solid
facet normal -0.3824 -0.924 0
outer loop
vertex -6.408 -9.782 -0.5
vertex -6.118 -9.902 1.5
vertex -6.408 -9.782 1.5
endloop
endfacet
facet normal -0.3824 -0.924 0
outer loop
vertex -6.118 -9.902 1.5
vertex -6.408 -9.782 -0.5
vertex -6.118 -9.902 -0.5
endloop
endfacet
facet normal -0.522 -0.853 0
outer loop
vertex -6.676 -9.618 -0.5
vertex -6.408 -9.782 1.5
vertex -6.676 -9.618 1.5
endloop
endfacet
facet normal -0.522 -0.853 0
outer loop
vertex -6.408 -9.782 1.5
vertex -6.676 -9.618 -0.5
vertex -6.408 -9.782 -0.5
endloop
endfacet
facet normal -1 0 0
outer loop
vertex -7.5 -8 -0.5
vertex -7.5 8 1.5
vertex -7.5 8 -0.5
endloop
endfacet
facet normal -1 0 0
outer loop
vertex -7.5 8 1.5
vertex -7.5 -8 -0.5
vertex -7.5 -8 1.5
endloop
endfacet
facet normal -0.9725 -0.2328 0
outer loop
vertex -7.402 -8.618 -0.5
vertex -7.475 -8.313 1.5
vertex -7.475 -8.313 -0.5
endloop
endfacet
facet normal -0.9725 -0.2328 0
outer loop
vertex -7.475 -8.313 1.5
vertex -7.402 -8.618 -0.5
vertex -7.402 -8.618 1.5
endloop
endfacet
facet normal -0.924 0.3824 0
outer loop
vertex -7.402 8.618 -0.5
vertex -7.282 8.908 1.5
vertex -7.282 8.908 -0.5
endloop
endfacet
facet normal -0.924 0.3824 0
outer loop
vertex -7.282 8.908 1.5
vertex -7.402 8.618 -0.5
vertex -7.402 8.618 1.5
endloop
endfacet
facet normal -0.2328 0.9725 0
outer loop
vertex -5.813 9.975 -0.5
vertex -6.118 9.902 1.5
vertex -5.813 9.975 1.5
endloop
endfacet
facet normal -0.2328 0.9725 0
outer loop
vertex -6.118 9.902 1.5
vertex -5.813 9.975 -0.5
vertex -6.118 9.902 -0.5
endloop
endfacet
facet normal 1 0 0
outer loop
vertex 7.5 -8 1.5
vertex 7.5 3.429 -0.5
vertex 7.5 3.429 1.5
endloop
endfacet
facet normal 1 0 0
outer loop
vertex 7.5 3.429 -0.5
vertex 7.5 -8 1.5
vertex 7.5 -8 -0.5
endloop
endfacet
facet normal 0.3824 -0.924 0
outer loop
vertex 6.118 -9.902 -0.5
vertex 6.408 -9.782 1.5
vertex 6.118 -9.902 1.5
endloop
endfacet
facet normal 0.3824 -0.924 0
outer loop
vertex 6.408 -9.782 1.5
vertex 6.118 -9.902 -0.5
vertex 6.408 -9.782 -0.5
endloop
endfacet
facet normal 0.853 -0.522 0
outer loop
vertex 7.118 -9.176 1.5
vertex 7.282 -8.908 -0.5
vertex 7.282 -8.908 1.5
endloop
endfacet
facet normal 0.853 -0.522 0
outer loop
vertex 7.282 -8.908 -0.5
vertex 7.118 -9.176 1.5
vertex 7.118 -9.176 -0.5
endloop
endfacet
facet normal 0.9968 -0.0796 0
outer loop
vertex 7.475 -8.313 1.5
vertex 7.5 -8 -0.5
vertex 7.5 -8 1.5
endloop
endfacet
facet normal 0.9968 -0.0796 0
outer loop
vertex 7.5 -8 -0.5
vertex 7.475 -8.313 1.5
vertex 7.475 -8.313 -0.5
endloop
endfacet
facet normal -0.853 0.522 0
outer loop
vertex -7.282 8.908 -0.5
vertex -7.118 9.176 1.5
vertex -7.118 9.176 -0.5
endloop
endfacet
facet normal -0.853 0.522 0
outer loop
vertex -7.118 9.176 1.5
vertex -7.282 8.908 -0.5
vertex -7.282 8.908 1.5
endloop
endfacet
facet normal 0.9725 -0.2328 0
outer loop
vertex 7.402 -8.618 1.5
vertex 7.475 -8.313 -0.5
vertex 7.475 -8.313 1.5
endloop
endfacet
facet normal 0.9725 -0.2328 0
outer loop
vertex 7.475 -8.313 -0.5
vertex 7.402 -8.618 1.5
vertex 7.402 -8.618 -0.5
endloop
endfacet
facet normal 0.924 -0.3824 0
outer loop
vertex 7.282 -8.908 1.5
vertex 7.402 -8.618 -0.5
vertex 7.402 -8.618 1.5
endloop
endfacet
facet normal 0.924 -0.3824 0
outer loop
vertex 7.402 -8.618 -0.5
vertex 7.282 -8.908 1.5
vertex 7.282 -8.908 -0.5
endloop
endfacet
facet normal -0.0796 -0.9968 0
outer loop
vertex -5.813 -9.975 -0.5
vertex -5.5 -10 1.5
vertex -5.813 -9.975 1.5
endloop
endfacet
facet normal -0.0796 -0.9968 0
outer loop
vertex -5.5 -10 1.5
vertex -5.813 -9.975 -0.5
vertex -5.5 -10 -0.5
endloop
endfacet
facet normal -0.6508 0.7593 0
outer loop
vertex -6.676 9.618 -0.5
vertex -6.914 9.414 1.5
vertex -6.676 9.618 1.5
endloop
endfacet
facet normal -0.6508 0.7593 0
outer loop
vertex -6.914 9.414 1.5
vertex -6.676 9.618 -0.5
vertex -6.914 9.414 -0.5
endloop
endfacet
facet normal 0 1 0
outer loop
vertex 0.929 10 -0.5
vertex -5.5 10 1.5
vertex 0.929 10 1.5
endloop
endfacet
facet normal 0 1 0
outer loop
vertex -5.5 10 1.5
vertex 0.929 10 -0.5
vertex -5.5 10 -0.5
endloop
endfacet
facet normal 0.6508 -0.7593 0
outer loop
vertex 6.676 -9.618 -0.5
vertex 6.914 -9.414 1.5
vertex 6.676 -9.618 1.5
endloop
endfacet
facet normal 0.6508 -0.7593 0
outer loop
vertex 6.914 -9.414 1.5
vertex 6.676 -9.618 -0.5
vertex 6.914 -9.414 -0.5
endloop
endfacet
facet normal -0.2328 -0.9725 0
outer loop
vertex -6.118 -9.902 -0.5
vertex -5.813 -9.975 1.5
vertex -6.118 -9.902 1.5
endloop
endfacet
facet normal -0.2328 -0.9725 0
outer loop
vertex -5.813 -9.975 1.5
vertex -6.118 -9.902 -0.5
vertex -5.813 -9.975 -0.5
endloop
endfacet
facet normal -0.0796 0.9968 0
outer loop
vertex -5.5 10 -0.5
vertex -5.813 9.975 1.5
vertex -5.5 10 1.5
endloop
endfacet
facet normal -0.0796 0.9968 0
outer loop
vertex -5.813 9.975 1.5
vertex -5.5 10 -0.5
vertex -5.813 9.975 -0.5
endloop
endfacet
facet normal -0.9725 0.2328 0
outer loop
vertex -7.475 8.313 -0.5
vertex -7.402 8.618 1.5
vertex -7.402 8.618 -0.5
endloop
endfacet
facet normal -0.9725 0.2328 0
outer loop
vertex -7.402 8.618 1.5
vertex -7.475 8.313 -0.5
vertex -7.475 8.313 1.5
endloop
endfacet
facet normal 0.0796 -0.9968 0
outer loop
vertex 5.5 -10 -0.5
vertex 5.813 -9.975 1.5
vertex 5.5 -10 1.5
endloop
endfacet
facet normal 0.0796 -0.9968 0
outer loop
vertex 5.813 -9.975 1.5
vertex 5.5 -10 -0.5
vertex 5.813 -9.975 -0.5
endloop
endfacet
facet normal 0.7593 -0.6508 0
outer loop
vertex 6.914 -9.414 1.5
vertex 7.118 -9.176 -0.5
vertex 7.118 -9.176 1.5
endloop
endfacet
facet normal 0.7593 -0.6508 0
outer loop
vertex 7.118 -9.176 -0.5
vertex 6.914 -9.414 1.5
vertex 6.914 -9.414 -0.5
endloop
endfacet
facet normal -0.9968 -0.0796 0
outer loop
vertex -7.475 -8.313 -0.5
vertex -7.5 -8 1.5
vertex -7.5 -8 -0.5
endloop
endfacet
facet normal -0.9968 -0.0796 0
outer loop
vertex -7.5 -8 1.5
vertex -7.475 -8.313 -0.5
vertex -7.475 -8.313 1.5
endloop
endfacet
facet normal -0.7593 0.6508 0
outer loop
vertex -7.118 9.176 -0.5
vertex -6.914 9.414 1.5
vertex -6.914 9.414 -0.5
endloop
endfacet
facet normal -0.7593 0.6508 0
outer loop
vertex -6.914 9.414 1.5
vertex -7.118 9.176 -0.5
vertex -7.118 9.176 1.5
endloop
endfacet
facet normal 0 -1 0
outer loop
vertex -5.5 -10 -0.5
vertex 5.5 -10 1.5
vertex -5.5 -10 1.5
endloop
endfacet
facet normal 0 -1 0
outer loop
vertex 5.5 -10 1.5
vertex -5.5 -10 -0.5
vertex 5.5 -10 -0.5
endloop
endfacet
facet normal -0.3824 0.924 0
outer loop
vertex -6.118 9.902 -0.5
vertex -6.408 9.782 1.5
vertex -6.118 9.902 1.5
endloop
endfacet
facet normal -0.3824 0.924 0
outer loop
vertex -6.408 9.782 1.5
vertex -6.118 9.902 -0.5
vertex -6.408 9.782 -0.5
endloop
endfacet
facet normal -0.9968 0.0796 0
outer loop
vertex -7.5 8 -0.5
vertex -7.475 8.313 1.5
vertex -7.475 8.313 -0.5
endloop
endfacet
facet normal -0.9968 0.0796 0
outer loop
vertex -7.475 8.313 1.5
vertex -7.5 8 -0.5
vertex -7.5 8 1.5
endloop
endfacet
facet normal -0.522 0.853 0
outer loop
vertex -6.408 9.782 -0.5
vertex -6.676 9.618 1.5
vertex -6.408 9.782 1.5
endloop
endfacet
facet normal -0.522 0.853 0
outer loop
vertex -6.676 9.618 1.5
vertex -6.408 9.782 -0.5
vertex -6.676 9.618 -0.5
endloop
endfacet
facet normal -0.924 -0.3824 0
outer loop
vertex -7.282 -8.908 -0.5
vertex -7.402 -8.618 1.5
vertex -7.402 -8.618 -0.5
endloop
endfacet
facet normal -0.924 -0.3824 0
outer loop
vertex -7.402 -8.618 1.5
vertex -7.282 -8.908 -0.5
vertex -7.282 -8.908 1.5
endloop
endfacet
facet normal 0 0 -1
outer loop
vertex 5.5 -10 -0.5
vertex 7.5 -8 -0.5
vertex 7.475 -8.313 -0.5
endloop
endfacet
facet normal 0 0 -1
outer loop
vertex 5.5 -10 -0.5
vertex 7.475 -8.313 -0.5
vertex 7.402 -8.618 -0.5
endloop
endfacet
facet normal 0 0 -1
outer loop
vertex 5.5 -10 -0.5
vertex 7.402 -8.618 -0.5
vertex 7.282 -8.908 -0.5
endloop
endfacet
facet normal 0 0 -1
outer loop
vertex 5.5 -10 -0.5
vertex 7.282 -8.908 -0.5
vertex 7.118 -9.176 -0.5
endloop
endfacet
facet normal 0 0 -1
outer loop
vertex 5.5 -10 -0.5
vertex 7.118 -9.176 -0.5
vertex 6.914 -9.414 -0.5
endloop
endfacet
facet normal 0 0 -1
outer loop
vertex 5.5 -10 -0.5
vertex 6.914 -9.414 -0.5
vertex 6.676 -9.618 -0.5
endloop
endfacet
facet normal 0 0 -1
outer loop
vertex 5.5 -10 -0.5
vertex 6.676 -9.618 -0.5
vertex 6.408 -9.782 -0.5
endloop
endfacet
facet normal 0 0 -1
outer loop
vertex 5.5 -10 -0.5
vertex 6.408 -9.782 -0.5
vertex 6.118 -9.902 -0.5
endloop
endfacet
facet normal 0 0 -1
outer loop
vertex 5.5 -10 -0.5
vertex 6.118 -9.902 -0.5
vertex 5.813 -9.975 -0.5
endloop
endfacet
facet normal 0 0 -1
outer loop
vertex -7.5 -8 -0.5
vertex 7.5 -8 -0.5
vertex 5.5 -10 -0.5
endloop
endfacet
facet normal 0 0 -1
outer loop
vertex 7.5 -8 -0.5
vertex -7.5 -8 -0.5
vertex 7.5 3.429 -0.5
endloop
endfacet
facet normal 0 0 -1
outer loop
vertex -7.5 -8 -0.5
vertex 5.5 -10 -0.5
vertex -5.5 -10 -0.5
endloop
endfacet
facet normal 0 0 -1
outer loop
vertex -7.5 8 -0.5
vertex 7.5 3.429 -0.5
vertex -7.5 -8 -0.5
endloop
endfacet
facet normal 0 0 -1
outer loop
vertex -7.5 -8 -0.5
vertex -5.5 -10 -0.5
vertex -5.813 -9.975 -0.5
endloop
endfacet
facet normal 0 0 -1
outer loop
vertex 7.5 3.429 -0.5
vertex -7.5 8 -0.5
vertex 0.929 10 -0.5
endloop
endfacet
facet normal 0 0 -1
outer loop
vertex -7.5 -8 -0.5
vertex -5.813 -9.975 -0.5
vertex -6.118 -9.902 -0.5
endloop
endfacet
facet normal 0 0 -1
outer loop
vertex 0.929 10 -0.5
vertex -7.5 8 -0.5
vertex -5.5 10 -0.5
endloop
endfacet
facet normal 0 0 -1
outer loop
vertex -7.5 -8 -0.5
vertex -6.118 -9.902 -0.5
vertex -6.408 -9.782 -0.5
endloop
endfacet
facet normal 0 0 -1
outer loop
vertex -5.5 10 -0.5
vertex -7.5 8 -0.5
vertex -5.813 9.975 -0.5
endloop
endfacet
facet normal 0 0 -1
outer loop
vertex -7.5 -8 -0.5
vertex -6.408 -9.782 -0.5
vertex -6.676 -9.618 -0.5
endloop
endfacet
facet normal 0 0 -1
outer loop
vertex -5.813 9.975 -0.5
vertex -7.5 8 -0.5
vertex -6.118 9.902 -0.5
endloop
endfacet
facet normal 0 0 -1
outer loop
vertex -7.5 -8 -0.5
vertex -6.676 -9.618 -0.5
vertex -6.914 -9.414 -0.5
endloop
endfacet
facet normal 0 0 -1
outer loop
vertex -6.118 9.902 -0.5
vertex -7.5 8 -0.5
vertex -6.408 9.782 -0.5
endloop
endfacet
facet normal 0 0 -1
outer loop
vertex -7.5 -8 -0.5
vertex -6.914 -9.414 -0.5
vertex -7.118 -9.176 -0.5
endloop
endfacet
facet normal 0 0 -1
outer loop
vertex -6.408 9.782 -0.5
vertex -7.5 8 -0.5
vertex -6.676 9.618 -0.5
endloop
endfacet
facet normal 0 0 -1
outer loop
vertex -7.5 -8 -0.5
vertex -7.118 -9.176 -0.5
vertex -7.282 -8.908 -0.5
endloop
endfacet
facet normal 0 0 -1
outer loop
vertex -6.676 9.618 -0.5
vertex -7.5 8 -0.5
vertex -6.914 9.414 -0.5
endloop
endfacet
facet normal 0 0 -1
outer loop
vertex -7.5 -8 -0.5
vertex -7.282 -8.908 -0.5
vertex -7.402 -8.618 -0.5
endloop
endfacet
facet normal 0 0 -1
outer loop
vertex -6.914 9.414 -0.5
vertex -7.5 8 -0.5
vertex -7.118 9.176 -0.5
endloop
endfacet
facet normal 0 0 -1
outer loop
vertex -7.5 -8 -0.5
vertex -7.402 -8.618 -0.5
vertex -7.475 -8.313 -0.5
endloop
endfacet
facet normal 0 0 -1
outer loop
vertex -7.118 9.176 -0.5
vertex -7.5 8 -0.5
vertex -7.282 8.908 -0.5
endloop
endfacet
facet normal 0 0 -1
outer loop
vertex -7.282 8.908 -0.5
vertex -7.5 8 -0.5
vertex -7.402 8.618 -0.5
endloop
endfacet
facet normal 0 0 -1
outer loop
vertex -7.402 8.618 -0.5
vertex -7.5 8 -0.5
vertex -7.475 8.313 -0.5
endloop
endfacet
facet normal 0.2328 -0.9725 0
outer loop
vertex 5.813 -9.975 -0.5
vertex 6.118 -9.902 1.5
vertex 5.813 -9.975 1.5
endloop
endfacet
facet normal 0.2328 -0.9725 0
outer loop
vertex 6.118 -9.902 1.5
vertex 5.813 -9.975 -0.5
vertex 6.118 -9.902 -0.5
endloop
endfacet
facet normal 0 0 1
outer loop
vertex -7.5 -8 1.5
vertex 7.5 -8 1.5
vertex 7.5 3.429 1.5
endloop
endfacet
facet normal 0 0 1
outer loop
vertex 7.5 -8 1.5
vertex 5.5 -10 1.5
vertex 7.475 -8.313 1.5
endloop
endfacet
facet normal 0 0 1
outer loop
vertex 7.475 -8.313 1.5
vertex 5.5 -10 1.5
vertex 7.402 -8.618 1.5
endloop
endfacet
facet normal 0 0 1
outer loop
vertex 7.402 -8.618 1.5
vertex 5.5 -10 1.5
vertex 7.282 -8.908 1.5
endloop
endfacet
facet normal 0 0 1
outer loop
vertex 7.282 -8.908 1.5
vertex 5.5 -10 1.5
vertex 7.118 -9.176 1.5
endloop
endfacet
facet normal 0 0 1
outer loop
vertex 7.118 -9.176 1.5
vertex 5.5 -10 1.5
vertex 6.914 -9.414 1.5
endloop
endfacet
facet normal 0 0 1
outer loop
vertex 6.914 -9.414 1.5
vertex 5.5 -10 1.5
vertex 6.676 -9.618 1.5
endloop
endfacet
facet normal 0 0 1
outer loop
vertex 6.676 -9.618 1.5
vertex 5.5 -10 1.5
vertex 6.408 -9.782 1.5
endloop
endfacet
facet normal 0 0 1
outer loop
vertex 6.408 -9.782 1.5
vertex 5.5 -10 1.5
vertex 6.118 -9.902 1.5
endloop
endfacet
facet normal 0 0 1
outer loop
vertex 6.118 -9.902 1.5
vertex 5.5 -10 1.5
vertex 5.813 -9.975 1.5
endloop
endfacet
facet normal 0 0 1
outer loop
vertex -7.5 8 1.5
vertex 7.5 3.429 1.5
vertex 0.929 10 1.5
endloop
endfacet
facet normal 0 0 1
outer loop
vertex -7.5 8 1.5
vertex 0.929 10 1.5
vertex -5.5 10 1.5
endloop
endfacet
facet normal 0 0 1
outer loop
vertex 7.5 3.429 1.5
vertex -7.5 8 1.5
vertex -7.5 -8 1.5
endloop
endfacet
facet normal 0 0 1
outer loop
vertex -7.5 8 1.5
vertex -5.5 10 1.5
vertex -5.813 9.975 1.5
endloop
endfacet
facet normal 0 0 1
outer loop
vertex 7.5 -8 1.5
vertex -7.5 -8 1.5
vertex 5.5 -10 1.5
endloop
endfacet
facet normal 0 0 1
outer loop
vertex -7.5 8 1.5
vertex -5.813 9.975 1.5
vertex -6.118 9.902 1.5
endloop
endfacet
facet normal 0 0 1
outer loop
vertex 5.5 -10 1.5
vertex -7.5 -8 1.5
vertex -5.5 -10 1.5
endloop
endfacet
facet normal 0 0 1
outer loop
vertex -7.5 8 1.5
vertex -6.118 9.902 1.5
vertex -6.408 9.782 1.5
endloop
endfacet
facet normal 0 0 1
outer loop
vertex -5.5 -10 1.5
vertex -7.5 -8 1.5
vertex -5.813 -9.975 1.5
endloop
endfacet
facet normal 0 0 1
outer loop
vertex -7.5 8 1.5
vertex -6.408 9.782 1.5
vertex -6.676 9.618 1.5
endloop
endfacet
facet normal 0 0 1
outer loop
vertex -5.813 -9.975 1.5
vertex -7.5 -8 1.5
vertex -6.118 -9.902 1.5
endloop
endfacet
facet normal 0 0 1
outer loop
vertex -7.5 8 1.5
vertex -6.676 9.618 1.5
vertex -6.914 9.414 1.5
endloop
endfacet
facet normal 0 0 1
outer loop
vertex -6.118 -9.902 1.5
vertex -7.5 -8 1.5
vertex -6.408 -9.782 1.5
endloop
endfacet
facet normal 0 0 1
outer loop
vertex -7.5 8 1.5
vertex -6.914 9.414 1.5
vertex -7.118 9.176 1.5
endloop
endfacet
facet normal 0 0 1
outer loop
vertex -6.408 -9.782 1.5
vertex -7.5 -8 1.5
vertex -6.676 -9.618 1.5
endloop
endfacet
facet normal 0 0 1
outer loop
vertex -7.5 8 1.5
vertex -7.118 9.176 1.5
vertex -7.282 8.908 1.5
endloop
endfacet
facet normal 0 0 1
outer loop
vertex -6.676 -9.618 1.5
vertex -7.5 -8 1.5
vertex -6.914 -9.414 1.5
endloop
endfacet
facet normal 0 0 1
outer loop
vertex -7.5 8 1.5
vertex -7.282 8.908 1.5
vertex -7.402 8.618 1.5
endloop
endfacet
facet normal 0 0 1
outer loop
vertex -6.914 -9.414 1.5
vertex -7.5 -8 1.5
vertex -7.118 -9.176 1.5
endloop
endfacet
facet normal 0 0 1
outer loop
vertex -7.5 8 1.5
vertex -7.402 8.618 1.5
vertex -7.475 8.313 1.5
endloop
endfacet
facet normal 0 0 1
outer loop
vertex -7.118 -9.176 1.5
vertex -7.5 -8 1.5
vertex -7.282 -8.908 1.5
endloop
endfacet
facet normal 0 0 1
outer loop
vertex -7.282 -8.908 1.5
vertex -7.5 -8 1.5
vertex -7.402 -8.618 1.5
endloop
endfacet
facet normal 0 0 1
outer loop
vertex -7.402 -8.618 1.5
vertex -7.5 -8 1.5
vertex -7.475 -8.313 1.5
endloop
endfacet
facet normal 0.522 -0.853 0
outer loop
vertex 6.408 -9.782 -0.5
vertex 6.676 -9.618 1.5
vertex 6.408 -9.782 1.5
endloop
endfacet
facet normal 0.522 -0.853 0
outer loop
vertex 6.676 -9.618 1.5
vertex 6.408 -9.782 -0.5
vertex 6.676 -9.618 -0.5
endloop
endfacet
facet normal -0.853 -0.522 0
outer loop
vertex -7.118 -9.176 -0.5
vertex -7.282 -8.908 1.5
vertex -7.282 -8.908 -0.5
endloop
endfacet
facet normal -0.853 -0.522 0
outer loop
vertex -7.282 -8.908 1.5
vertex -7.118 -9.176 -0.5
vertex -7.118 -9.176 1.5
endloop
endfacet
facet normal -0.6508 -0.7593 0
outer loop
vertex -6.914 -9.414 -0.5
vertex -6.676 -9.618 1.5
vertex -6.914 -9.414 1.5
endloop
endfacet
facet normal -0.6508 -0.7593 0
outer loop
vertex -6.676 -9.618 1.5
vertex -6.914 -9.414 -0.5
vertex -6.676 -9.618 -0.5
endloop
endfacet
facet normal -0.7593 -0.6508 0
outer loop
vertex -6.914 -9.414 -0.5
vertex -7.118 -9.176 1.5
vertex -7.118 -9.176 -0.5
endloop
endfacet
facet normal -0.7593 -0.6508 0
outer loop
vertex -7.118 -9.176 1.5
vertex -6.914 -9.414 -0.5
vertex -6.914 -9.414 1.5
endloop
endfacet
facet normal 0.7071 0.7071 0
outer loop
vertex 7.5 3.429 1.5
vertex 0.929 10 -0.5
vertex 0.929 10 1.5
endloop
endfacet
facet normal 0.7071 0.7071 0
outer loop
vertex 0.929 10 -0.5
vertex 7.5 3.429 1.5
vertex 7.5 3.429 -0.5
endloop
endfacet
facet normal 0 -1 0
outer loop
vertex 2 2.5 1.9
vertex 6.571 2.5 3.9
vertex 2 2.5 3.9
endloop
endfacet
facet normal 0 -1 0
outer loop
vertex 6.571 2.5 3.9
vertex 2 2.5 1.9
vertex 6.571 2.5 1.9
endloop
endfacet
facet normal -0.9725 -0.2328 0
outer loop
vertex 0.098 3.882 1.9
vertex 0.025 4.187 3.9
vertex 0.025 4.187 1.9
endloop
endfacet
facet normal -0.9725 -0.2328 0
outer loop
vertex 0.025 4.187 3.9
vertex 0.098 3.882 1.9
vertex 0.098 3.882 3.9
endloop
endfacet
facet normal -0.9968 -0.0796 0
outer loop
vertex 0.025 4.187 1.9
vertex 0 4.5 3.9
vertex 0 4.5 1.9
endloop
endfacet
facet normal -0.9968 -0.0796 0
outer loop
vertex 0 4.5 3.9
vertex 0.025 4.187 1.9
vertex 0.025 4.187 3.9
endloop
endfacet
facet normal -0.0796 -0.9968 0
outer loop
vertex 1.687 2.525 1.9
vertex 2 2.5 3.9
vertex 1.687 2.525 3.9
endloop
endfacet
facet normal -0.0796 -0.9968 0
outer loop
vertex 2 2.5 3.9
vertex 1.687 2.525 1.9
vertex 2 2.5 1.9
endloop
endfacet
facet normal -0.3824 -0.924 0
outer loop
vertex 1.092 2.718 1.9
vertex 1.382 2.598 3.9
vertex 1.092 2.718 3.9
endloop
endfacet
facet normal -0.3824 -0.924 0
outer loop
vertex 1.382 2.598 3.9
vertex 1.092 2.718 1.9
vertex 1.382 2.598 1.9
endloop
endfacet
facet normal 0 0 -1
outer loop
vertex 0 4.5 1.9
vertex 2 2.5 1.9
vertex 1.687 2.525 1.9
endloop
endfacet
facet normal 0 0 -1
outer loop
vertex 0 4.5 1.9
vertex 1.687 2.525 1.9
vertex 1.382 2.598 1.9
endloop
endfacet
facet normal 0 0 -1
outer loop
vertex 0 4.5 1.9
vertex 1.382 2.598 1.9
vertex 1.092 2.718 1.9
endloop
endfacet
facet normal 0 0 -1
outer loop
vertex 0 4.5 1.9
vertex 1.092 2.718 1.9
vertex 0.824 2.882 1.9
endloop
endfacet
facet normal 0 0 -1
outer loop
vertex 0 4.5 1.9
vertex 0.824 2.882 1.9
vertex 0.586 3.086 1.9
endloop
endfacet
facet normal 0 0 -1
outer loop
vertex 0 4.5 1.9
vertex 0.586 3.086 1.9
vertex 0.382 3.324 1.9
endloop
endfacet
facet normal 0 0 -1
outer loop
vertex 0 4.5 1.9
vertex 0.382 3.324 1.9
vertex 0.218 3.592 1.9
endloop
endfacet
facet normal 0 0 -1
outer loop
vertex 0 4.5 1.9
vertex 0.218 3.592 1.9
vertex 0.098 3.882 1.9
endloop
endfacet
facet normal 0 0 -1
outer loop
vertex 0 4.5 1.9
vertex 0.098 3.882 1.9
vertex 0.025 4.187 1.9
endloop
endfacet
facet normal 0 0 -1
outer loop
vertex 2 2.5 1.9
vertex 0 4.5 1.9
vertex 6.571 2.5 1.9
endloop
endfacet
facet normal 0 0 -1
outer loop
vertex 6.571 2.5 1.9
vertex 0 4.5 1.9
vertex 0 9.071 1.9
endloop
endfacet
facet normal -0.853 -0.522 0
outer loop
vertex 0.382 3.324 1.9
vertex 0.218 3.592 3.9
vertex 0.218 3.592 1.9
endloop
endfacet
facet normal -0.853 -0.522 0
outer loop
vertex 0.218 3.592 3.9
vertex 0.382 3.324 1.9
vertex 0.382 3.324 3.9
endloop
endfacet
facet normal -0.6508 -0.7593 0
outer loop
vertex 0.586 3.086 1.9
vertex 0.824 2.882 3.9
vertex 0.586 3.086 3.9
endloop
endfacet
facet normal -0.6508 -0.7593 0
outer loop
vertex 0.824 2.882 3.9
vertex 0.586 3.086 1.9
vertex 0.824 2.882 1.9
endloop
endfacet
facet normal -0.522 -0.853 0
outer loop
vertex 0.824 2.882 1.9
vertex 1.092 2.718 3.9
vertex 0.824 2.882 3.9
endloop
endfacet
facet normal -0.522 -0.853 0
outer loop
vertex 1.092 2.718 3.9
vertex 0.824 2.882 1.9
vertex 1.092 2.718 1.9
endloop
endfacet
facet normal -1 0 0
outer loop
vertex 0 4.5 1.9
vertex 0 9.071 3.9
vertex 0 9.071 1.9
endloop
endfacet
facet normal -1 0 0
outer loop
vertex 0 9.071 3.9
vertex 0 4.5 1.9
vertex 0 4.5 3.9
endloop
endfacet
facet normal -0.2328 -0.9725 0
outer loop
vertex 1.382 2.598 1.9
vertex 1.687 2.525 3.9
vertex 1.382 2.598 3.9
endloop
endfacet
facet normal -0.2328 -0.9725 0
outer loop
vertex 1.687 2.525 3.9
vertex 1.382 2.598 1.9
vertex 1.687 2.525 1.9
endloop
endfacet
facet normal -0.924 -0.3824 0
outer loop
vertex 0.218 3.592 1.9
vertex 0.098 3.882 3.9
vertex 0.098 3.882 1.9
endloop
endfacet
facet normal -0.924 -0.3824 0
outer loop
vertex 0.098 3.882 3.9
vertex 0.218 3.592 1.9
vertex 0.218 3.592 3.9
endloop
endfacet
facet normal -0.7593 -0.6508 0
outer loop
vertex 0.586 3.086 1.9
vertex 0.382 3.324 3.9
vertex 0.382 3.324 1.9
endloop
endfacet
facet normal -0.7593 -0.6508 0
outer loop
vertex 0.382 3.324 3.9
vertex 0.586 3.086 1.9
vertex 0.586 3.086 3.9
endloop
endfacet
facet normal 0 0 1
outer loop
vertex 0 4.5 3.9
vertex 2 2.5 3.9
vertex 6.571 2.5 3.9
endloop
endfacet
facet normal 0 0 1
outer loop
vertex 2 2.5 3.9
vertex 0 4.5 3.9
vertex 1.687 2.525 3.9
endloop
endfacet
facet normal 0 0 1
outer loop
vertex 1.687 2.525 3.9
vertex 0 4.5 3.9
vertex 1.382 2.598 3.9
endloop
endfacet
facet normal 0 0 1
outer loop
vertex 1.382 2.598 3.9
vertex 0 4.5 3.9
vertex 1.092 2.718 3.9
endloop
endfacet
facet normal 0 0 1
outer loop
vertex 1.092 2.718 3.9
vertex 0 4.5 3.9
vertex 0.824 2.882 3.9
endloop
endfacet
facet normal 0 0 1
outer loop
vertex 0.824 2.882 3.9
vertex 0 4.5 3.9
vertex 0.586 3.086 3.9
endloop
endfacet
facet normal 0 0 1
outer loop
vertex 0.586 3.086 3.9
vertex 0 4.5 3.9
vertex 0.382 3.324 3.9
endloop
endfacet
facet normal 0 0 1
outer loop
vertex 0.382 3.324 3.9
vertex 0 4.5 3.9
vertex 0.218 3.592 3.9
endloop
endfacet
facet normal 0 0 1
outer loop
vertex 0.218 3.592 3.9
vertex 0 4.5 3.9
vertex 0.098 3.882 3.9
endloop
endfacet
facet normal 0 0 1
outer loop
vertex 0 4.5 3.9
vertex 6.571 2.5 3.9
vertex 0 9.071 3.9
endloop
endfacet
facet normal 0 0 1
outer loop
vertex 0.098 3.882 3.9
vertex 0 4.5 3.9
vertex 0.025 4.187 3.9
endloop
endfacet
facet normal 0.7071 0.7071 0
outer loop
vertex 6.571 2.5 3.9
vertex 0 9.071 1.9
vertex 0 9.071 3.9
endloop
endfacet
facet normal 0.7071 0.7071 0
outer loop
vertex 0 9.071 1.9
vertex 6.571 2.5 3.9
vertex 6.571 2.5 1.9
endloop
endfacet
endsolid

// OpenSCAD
module RoundedRect(width, height, depth, cornerRadius) {
  minkowski() {
    cube([width, height, depth], center = true);
    cylinder(r = cornerRadius, h = depth);
  }
}

module OpenSessionPanelIcon() {
  module Rect() {
    RoundedRect(width = 11, height = 16, depth = 1, cornerRadius = 2);
  }
  module Slicer() {
    translate([8, 10, 0]) rotate([0, 0, -45])
      cube([20, 10, 12], center = true);
  }
  module MainPart() {
    difference() {
      Rect();
      Slicer();
    }
  }
  module Corner() {
    translate([10, 10, 2.4]) mirror([1, 1, 0]) intersection() {
      Rect();
      Slicer();
    }
  }
  MainPart();
  Corner();
}

OpenSessionPanelIcon($fn = 40);
